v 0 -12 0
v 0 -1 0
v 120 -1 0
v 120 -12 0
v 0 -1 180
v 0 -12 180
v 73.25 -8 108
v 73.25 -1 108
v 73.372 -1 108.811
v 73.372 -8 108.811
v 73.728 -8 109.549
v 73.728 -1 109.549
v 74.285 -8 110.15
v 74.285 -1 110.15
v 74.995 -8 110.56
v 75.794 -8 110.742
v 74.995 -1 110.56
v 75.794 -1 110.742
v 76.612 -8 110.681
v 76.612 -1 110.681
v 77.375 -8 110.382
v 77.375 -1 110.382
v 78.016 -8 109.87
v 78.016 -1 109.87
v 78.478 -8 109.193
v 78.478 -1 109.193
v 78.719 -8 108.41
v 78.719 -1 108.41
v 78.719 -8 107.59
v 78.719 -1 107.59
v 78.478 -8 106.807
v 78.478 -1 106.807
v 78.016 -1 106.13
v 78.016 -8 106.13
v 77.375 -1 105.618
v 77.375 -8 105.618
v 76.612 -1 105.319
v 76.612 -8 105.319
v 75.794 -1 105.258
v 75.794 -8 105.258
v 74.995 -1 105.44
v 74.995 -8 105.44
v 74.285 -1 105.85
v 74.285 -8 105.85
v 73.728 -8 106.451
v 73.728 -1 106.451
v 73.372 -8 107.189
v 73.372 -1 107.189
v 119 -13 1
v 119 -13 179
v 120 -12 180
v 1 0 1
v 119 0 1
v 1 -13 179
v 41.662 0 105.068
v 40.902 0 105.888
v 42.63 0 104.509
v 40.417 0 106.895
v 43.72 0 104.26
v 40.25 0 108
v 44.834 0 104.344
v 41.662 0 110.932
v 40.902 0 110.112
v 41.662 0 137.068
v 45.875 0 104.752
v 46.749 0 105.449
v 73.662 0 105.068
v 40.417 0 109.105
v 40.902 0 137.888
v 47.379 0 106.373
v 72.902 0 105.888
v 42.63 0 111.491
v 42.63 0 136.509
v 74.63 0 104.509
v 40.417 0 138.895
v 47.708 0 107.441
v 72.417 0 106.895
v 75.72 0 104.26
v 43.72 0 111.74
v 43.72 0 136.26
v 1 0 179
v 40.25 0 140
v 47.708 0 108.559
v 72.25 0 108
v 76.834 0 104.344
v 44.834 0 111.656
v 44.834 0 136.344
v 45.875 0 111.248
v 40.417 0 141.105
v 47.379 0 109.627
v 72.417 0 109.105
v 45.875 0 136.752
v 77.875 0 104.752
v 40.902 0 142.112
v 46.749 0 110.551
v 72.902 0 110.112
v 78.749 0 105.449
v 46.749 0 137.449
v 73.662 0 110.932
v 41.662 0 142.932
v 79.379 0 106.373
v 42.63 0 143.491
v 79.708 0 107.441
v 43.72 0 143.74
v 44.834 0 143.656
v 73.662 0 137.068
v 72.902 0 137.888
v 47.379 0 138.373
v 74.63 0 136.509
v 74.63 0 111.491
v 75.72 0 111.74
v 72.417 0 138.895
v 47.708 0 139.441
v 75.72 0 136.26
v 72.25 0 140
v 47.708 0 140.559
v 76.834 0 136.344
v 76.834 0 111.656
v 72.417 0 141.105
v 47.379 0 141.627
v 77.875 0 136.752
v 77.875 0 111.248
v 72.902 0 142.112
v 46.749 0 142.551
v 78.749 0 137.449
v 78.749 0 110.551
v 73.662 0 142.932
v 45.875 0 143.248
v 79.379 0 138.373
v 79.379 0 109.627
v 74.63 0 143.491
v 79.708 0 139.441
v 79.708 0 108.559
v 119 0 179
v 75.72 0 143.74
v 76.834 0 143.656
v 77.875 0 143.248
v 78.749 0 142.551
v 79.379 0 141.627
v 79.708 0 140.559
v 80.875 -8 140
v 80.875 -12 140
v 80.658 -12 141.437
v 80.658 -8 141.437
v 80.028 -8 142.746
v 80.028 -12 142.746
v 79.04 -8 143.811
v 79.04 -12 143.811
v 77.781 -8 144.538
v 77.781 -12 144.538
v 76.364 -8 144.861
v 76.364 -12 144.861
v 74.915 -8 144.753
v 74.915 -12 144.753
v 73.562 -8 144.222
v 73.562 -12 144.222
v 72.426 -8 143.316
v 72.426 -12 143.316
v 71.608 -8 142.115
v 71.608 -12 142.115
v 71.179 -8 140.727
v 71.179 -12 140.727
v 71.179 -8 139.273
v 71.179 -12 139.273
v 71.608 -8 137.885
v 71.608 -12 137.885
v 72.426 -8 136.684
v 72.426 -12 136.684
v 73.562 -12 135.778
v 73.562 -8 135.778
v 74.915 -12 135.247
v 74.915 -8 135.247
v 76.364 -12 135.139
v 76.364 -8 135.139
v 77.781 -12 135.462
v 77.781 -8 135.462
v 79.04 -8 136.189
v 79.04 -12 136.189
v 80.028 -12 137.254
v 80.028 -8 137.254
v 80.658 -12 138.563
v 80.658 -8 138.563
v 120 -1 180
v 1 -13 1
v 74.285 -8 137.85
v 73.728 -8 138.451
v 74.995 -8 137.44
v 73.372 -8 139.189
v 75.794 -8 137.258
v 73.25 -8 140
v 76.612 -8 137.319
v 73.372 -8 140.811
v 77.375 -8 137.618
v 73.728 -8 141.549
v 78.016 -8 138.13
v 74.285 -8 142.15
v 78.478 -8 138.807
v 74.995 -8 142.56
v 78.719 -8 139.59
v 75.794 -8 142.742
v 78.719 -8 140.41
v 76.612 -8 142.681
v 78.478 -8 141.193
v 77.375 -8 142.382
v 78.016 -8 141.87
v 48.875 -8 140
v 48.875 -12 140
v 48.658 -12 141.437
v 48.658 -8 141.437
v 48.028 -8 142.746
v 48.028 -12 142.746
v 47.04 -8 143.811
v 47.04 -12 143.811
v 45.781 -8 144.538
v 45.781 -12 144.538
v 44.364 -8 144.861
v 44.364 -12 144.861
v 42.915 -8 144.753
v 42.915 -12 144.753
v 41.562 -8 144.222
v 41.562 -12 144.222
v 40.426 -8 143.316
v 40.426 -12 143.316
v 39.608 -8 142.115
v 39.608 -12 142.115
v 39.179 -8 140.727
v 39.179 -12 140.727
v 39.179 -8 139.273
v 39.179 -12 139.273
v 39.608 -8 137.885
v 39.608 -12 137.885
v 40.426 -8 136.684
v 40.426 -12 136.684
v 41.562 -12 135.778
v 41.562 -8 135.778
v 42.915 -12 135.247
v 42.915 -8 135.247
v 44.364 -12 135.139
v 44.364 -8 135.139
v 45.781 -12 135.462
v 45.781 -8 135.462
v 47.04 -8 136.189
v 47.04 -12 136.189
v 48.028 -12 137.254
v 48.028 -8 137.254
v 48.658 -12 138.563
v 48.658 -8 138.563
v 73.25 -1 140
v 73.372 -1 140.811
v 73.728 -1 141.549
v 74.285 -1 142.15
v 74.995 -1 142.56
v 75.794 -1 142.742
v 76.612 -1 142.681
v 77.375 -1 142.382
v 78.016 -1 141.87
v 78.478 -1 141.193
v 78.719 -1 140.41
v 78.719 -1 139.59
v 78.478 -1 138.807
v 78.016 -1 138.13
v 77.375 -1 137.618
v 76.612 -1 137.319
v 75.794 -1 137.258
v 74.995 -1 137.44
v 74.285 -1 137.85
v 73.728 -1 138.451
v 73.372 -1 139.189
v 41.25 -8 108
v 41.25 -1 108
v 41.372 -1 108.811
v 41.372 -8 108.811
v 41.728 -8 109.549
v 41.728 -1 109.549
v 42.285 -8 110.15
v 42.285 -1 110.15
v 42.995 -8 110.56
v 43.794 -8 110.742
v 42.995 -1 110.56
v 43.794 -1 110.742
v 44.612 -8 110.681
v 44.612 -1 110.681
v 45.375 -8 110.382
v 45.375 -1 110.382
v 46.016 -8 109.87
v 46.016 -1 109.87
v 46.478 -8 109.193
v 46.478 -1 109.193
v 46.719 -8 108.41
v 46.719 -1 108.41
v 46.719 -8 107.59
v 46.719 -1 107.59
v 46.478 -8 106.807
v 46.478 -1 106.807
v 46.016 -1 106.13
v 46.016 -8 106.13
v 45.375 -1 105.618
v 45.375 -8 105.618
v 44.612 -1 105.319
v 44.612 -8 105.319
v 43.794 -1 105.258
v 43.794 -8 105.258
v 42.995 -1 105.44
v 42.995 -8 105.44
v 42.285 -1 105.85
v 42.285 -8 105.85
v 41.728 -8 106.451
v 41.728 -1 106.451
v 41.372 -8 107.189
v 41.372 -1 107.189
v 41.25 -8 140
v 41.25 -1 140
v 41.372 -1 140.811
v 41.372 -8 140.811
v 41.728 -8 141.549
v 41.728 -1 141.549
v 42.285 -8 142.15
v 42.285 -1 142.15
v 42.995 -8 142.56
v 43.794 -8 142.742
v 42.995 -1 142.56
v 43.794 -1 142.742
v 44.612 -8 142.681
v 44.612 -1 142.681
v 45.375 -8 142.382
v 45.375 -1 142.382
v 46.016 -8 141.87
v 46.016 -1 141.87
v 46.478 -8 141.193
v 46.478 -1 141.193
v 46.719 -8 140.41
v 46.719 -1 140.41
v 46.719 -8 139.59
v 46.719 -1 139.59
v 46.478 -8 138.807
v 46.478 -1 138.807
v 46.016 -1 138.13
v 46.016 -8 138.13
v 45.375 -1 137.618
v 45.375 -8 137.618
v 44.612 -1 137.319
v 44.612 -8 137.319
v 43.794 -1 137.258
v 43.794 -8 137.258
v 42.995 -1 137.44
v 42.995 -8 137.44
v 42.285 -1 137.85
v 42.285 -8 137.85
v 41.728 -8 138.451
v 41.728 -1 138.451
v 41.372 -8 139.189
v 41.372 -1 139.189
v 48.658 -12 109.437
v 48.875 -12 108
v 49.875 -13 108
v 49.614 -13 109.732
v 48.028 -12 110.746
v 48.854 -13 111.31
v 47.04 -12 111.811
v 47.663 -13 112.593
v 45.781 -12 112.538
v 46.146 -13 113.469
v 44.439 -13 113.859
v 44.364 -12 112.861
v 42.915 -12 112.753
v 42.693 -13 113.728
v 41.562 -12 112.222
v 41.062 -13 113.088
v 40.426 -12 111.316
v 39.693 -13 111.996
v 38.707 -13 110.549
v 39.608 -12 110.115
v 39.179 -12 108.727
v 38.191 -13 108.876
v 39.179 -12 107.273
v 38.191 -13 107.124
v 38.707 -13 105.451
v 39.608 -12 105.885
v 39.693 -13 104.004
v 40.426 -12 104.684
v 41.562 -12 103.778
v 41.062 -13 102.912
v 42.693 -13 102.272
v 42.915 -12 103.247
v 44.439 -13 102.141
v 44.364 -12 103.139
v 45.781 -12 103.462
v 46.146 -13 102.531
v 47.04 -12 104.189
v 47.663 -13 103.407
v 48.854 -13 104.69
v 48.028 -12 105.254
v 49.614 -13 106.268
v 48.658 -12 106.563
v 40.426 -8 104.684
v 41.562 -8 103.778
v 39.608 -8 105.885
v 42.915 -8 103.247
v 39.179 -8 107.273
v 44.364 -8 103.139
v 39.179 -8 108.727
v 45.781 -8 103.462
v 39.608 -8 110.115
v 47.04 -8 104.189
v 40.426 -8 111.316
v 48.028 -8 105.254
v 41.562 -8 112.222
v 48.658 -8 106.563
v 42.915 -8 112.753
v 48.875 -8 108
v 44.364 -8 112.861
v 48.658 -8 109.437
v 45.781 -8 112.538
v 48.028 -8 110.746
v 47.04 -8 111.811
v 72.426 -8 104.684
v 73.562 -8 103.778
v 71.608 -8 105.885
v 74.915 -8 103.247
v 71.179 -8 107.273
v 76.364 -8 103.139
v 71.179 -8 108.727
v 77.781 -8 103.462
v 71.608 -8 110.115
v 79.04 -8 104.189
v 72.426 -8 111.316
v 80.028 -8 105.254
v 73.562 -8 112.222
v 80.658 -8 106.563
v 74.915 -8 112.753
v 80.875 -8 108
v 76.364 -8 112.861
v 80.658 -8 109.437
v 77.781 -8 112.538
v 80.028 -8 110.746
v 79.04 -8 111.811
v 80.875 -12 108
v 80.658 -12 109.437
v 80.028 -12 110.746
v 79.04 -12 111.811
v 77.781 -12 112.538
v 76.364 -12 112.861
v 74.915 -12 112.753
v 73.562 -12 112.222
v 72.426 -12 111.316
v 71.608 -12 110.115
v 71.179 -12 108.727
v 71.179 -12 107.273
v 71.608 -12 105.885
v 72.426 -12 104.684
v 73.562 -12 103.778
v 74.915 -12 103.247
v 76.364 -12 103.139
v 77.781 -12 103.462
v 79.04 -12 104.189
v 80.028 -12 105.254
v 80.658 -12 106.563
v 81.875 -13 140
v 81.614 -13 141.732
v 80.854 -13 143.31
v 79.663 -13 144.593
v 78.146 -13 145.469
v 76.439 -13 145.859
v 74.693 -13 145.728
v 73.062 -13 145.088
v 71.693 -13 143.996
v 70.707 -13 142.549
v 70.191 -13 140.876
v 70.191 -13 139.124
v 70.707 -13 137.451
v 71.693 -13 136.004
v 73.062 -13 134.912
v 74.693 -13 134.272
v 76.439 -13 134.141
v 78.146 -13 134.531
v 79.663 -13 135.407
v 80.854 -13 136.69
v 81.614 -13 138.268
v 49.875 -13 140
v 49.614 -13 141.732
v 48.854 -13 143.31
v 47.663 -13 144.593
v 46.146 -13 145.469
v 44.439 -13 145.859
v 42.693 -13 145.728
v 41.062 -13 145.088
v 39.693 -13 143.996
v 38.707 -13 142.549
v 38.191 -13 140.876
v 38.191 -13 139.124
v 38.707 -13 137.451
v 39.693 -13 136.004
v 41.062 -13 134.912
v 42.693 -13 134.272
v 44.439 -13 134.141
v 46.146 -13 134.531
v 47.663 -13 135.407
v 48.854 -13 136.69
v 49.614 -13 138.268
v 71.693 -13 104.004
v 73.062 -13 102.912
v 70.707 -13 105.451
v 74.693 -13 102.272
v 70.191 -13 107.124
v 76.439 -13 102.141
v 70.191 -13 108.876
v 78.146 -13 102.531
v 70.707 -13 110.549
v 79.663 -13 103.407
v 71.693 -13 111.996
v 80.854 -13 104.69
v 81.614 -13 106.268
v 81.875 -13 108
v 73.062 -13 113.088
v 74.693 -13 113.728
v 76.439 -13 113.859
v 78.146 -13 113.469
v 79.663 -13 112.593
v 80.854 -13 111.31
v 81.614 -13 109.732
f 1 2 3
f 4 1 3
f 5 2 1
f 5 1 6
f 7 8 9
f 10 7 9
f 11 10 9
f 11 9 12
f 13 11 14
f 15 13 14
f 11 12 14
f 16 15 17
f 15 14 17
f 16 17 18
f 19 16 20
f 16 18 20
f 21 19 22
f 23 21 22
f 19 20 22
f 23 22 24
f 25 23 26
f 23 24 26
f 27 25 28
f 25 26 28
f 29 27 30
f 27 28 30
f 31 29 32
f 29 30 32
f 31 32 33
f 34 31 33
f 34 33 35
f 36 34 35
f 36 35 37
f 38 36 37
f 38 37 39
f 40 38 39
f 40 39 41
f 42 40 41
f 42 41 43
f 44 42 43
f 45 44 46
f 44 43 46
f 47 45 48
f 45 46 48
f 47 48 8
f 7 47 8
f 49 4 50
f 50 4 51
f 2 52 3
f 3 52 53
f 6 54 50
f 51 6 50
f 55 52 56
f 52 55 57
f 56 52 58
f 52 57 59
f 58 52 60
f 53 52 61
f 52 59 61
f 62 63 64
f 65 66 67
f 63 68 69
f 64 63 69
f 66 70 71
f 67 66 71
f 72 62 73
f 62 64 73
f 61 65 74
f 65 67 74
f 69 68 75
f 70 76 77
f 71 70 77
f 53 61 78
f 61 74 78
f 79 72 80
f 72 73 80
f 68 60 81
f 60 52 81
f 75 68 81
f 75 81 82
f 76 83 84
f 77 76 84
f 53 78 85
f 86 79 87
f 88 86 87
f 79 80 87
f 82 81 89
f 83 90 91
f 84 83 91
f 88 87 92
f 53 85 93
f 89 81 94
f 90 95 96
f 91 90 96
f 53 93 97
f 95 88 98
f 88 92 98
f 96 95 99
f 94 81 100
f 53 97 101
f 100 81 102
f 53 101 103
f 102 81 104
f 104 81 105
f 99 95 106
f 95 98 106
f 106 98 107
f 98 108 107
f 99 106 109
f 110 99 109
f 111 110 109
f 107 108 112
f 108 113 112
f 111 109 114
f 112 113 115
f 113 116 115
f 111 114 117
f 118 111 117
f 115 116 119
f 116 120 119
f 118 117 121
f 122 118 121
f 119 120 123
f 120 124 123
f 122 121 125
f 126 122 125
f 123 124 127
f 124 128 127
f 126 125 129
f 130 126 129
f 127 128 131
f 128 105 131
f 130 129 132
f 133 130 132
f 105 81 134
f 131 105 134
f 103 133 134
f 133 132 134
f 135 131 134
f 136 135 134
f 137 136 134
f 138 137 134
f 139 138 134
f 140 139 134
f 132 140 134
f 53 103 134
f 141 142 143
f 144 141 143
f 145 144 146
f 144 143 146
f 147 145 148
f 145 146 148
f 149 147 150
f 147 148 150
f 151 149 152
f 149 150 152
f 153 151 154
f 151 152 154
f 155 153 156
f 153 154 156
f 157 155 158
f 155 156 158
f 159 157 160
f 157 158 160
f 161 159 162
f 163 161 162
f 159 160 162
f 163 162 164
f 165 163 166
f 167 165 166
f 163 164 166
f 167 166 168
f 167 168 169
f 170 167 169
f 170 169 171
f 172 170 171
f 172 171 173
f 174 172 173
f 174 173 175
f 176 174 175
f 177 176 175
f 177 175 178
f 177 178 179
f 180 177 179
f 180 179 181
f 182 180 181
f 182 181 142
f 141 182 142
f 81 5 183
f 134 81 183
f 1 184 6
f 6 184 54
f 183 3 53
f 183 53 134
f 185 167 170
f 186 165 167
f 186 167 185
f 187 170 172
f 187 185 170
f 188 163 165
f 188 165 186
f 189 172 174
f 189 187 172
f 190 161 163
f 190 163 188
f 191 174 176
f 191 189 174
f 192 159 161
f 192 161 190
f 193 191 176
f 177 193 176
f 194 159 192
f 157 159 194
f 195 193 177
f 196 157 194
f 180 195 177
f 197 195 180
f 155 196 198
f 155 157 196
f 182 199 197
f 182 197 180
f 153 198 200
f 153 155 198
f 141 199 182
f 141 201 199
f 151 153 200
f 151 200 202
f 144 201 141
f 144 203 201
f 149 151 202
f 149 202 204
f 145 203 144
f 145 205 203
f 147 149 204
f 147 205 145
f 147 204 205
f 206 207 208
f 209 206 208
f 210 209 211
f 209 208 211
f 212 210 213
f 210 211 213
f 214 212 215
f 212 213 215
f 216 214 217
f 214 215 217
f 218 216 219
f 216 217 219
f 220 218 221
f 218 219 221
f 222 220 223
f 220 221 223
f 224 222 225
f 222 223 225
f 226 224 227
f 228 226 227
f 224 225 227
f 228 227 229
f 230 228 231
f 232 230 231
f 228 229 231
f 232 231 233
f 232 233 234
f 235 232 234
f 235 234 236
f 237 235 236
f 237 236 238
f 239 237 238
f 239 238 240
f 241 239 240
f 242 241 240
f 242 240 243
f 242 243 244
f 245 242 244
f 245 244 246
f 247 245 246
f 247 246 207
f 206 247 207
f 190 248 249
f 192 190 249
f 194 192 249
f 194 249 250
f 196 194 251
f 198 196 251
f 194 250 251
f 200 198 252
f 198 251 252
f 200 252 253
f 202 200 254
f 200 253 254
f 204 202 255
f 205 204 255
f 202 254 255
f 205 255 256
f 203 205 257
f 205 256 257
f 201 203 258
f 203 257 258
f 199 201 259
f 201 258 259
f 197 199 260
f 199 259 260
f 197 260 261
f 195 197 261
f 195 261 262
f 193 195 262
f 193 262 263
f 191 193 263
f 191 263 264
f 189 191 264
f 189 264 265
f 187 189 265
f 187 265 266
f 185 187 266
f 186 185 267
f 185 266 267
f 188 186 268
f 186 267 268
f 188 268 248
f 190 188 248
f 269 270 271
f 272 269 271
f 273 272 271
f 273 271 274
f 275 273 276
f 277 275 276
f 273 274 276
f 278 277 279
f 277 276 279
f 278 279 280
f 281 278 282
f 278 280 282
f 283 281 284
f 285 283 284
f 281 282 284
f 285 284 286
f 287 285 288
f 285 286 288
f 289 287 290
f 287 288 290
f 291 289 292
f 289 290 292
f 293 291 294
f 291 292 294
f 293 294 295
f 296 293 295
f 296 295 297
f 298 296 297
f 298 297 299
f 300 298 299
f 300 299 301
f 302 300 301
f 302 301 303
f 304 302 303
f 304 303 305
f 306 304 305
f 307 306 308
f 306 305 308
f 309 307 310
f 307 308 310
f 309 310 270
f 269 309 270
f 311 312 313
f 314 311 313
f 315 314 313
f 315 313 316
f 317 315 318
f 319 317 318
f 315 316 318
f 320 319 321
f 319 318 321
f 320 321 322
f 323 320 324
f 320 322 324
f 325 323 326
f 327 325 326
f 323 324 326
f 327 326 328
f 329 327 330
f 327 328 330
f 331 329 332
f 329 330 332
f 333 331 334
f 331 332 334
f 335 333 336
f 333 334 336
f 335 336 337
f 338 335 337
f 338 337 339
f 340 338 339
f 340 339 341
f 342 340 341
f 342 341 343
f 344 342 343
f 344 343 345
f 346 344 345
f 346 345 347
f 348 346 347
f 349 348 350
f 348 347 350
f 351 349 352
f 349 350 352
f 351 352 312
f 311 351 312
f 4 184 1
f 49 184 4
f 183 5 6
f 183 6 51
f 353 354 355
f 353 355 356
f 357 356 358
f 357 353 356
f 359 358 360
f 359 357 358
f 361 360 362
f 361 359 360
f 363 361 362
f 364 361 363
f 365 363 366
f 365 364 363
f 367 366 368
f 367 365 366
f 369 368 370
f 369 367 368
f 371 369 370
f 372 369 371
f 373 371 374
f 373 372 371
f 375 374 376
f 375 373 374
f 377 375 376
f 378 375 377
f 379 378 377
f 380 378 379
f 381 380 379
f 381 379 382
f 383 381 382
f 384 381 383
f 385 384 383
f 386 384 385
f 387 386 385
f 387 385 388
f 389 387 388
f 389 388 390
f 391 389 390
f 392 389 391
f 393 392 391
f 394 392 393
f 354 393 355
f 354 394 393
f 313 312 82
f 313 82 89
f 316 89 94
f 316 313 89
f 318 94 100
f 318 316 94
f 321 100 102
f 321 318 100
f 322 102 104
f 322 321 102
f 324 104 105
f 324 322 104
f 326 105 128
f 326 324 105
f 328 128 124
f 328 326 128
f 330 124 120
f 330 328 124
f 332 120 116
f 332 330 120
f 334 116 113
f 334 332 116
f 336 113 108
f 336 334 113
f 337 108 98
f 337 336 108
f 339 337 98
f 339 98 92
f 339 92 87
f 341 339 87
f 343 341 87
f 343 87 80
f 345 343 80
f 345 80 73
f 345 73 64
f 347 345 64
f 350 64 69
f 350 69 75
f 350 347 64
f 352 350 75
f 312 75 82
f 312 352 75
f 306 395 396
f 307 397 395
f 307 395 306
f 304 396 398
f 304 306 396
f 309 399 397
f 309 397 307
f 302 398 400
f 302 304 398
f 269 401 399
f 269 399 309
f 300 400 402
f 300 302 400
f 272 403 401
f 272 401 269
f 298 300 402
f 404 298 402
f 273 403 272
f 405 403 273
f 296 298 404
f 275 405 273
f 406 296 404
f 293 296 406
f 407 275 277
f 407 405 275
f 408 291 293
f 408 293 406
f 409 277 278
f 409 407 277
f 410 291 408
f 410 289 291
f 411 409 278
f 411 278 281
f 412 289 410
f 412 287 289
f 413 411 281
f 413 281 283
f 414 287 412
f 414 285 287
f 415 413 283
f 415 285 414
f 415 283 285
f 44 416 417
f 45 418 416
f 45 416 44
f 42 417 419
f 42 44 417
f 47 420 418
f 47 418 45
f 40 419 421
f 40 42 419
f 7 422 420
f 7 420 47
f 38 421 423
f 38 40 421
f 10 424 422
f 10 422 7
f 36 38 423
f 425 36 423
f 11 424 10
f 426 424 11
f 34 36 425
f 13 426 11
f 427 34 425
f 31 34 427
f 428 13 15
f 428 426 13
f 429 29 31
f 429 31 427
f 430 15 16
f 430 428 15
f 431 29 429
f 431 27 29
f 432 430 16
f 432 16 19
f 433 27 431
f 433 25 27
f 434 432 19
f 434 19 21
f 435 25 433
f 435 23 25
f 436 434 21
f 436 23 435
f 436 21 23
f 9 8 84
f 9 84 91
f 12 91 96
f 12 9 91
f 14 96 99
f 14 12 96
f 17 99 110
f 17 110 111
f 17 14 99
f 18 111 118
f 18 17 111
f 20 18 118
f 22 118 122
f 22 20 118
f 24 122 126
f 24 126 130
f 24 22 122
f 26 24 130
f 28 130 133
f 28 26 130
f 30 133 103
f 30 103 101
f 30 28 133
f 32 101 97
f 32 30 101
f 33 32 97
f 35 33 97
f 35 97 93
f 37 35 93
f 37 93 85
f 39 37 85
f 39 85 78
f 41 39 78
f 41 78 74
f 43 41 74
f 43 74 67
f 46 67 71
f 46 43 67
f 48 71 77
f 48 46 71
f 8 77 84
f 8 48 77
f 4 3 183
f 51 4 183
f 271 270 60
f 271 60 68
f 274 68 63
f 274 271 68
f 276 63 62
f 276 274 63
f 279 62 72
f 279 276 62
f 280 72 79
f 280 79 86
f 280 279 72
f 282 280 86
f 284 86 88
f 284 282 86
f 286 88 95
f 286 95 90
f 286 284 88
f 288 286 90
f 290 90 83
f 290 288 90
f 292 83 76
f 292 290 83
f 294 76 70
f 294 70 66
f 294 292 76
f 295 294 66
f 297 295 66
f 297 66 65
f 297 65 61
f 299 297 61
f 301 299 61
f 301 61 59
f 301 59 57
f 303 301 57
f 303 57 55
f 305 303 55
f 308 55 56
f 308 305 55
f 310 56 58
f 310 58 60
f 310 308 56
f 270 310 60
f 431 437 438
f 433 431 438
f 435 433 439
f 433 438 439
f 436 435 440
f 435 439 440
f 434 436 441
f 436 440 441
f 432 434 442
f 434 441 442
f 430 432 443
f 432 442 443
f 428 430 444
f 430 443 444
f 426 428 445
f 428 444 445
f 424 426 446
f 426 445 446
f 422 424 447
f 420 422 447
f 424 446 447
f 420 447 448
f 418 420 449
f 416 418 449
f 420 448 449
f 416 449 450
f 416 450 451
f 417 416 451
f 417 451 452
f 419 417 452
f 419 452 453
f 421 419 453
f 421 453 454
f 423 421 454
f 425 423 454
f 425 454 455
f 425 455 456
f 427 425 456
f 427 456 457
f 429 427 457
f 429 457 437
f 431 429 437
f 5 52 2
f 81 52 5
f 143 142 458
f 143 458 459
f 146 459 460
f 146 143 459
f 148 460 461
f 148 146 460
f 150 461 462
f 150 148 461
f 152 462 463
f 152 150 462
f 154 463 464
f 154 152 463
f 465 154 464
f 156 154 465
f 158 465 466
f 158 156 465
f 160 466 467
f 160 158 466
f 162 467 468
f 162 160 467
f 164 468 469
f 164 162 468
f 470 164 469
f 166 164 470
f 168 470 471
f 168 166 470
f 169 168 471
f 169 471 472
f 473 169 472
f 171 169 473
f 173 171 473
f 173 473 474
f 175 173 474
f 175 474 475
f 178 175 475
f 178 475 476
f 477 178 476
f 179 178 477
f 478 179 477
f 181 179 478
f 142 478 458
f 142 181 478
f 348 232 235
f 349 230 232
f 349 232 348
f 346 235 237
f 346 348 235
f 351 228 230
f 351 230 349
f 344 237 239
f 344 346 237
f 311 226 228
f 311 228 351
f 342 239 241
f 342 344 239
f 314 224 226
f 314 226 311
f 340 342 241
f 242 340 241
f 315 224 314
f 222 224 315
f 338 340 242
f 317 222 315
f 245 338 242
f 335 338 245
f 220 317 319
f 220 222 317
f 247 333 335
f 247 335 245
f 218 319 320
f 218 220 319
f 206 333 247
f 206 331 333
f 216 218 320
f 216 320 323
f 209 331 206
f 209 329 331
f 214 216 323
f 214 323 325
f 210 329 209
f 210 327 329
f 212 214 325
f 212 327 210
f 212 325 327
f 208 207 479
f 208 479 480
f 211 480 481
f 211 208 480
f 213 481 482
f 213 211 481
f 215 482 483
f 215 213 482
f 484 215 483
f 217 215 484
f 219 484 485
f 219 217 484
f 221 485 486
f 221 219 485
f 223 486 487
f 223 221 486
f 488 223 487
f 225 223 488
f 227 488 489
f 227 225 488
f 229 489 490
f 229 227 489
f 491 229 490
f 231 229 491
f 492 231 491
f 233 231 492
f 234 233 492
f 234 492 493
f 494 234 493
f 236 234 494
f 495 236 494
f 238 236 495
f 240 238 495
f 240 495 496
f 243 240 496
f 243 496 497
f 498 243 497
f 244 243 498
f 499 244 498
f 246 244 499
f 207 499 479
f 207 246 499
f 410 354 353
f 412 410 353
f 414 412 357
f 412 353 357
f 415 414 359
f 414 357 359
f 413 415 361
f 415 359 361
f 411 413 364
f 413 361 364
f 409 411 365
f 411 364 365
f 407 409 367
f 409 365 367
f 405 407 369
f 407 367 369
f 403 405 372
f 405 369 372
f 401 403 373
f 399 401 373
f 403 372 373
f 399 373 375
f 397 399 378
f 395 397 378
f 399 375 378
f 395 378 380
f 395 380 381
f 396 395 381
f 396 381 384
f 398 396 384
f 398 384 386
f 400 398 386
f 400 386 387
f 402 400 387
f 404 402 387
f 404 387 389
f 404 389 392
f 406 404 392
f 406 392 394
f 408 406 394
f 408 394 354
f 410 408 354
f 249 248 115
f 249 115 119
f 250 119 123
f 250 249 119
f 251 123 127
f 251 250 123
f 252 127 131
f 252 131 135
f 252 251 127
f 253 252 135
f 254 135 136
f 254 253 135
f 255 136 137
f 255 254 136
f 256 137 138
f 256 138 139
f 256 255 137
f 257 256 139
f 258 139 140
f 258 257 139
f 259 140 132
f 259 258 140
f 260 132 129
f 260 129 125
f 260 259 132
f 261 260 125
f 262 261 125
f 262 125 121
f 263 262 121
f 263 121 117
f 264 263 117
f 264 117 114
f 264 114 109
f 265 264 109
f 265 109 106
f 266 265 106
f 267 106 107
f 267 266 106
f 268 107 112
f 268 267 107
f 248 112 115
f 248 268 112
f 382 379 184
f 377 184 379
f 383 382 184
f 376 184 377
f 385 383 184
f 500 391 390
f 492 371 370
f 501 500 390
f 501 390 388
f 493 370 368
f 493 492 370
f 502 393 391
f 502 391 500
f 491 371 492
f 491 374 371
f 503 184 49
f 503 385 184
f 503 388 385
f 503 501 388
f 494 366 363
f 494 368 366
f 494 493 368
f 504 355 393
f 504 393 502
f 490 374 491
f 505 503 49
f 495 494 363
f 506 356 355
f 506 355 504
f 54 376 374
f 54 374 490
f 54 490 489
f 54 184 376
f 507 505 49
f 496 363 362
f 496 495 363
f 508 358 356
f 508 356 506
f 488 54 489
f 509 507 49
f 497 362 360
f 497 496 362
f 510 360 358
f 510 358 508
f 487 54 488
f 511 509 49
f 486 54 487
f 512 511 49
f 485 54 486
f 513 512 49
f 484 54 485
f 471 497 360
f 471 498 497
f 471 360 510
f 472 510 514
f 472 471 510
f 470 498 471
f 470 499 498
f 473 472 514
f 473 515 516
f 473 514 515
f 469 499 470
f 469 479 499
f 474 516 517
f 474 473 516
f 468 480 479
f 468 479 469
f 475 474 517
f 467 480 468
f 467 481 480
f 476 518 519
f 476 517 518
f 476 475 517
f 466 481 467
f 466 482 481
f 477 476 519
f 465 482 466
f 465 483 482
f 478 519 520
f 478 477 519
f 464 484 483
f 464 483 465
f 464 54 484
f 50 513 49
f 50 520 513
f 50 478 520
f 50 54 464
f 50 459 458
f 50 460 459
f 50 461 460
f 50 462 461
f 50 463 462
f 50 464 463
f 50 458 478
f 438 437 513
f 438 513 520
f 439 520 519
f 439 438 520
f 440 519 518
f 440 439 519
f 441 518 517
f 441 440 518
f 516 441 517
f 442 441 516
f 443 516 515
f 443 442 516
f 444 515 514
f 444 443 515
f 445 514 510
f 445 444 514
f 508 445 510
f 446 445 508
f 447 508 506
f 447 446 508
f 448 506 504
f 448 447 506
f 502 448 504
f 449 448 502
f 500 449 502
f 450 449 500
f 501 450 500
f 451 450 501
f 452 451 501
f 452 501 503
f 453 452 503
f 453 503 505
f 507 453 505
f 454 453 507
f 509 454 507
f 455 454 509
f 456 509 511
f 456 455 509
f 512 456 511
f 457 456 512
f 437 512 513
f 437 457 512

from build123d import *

# Parameters (mm, degrees)
F0_W           = 120
F0_H           = 180
F1_DEPTH       = 13
F3_D           = 5.5
F3_CBORE_D     = 9.75
F3_CBORE_DEPTH = 5
F4_SIZE        = 1
F5_SIZE        = 1


with BuildPart() as f1:
    # F0 (on Front) → F1 (new body)
    with BuildSketch(Plane.XZ):
        with Locations((60, 90)):
            Rectangle(F0_W, F0_H)
    extrude(amount=F1_DEPTH)

    # F3 (through all)
    with Locations(Plane.XZ.offset(13)):
        with Locations((44, 140), (44, 108), (76, 140), (76, 108)):
            CounterBoreHole(F3_D / 2, F3_CBORE_D / 2, F3_CBORE_DEPTH)

    # F4
    f4_edges = [f1.edges().sort_by_distance(p)[0] for p in [
        (60, -13, 180),
        (0, -13, 90),
        (60, -13, 0),
        (120, -13, 90),
        (39.125, -13, 108),
        (71.125, -13, 108),
        (39.125, -13, 140),
        (71.125, -13, 140),
    ]]
    chamfer(f4_edges, length=F4_SIZE)

    # F5
    f5_edges = [f1.edges().sort_by_distance(p)[0] for p in [
        (0, 0, 90),
        (60, 0, 180),
        (60, 0, 0),
        (120, 0, 90),
        (41.25, 0, 108),
        (73.25, 0, 108),
        (41.25, 0, 140),
        (73.25, 0, 140),
    ]]
    chamfer(f5_edges, length=F5_SIZE)


solid = f1.part
